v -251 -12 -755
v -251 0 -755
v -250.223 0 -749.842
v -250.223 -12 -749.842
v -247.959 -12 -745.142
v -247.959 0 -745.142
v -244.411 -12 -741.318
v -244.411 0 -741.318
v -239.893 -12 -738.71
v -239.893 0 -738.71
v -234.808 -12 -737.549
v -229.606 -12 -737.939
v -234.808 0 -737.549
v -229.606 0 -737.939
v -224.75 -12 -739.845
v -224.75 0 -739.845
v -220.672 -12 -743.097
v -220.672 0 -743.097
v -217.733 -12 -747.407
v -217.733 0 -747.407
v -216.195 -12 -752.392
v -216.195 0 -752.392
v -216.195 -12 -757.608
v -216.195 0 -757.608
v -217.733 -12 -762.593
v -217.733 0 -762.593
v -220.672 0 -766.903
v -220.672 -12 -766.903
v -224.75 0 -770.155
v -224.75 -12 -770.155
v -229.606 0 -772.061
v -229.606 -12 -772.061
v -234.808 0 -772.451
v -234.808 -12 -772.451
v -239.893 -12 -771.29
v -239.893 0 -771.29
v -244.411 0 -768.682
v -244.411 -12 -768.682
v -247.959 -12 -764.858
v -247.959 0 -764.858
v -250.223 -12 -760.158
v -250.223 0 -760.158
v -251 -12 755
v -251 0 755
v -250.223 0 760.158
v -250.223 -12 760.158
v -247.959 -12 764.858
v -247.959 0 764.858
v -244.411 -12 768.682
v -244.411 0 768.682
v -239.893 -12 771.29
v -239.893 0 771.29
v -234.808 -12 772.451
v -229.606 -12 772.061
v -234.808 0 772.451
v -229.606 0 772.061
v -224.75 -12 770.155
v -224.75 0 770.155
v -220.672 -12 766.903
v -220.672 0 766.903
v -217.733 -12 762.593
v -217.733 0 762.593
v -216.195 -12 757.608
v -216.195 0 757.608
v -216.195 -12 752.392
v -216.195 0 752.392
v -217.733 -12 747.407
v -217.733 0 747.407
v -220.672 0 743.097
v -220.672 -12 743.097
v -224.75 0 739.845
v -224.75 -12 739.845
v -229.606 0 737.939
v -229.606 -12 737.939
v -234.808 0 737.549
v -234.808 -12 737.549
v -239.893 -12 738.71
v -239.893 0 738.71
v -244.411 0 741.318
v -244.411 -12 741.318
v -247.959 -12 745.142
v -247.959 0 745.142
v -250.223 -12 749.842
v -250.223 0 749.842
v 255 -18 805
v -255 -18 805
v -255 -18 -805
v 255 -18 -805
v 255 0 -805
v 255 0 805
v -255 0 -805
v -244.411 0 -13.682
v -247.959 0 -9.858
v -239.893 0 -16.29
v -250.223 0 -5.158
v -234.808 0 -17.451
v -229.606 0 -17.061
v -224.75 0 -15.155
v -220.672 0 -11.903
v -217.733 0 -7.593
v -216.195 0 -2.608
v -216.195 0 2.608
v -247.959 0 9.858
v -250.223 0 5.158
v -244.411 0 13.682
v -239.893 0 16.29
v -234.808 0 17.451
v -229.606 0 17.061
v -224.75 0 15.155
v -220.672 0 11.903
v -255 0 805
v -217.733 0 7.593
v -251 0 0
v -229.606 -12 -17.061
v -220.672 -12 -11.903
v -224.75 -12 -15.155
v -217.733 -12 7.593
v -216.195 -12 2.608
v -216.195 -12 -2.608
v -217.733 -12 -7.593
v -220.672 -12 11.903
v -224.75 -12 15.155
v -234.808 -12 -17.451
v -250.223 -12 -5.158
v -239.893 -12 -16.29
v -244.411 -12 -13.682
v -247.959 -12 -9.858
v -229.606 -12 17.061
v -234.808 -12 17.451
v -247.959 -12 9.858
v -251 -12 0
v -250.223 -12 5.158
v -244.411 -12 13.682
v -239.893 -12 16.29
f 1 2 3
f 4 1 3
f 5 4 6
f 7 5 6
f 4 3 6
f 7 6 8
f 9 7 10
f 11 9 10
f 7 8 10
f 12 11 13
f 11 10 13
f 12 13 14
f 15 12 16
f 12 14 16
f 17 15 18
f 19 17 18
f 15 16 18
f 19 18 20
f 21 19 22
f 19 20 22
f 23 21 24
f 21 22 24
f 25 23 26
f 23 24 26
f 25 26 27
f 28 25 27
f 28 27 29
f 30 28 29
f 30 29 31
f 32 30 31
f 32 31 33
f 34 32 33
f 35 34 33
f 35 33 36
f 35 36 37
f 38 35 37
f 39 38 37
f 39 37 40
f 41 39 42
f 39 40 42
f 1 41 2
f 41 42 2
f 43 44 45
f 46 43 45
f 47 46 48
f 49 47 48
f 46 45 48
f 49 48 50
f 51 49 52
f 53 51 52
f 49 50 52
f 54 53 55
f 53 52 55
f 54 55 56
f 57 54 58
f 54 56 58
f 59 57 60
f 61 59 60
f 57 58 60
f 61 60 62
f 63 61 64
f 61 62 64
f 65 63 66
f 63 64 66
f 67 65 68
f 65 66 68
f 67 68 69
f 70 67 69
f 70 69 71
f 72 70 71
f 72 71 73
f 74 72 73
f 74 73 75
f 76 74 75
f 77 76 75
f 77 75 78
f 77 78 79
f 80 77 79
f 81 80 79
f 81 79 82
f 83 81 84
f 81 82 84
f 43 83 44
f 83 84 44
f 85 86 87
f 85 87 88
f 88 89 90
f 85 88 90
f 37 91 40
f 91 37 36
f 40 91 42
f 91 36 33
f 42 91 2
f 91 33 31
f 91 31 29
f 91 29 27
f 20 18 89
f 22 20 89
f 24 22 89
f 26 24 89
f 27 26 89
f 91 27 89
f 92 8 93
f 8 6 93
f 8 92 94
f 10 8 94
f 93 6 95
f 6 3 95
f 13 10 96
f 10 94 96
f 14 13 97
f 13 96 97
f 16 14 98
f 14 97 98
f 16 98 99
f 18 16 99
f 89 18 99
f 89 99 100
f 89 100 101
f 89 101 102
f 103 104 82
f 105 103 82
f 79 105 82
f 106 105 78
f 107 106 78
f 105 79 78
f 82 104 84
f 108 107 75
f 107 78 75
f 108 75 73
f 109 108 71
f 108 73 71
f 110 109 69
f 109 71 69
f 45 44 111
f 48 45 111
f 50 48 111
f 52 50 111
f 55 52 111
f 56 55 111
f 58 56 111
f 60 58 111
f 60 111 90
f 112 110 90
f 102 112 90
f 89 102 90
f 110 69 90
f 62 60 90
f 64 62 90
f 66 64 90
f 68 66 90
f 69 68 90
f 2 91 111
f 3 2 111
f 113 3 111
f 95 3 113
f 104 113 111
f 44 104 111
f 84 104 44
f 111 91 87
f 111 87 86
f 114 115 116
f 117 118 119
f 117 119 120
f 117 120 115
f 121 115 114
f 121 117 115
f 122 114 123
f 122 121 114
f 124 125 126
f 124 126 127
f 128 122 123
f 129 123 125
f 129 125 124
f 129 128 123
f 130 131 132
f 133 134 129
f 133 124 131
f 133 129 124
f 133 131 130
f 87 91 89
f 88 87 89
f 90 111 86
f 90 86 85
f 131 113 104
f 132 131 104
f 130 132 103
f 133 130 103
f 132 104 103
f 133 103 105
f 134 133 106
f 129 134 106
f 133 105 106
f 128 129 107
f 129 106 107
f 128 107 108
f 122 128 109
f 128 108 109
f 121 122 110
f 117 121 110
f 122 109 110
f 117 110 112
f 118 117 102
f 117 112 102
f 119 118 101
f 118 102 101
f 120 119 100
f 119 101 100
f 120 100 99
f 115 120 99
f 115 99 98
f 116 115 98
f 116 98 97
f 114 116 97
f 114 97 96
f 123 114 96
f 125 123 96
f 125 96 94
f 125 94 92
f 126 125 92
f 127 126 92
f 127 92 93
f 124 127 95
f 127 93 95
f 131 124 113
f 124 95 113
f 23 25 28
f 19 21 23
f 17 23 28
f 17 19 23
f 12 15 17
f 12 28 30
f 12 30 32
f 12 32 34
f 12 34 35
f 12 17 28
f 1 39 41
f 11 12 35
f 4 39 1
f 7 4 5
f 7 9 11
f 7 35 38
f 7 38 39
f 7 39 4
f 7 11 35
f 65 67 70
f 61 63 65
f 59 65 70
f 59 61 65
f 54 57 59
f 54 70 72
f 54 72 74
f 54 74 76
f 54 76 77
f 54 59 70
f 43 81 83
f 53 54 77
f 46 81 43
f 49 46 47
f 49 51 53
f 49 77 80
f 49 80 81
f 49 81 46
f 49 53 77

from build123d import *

# Parameters (mm, degrees)
F0_W     = 510
F0_H     = 1610
F1_DEPTH = 18
F2_R     = 17.5
F3_DEPTH = 12


with BuildPart() as f1:
    # F0 (on Front) → F1 (new body)
    with BuildSketch(Plane.XZ):
        Rectangle(F0_W, F0_H)
    extrude(amount=F1_DEPTH)

    # F2 (on face) → F3 (cut)
    with BuildSketch(Plane(origin=(0, 0, 0), x_dir=(-1, 0, 0), z_dir=(0, 1, 0))):
        with Locations((233.5, -755)):
            Circle(F2_R)
        with Locations((233.5, 0)):
            Circle(F2_R)
        with Locations((233.5, 755)):
            Circle(F2_R)
    extrude(amount=-F3_DEPTH, mode=Mode.SUBTRACT)


solid = f1.part
